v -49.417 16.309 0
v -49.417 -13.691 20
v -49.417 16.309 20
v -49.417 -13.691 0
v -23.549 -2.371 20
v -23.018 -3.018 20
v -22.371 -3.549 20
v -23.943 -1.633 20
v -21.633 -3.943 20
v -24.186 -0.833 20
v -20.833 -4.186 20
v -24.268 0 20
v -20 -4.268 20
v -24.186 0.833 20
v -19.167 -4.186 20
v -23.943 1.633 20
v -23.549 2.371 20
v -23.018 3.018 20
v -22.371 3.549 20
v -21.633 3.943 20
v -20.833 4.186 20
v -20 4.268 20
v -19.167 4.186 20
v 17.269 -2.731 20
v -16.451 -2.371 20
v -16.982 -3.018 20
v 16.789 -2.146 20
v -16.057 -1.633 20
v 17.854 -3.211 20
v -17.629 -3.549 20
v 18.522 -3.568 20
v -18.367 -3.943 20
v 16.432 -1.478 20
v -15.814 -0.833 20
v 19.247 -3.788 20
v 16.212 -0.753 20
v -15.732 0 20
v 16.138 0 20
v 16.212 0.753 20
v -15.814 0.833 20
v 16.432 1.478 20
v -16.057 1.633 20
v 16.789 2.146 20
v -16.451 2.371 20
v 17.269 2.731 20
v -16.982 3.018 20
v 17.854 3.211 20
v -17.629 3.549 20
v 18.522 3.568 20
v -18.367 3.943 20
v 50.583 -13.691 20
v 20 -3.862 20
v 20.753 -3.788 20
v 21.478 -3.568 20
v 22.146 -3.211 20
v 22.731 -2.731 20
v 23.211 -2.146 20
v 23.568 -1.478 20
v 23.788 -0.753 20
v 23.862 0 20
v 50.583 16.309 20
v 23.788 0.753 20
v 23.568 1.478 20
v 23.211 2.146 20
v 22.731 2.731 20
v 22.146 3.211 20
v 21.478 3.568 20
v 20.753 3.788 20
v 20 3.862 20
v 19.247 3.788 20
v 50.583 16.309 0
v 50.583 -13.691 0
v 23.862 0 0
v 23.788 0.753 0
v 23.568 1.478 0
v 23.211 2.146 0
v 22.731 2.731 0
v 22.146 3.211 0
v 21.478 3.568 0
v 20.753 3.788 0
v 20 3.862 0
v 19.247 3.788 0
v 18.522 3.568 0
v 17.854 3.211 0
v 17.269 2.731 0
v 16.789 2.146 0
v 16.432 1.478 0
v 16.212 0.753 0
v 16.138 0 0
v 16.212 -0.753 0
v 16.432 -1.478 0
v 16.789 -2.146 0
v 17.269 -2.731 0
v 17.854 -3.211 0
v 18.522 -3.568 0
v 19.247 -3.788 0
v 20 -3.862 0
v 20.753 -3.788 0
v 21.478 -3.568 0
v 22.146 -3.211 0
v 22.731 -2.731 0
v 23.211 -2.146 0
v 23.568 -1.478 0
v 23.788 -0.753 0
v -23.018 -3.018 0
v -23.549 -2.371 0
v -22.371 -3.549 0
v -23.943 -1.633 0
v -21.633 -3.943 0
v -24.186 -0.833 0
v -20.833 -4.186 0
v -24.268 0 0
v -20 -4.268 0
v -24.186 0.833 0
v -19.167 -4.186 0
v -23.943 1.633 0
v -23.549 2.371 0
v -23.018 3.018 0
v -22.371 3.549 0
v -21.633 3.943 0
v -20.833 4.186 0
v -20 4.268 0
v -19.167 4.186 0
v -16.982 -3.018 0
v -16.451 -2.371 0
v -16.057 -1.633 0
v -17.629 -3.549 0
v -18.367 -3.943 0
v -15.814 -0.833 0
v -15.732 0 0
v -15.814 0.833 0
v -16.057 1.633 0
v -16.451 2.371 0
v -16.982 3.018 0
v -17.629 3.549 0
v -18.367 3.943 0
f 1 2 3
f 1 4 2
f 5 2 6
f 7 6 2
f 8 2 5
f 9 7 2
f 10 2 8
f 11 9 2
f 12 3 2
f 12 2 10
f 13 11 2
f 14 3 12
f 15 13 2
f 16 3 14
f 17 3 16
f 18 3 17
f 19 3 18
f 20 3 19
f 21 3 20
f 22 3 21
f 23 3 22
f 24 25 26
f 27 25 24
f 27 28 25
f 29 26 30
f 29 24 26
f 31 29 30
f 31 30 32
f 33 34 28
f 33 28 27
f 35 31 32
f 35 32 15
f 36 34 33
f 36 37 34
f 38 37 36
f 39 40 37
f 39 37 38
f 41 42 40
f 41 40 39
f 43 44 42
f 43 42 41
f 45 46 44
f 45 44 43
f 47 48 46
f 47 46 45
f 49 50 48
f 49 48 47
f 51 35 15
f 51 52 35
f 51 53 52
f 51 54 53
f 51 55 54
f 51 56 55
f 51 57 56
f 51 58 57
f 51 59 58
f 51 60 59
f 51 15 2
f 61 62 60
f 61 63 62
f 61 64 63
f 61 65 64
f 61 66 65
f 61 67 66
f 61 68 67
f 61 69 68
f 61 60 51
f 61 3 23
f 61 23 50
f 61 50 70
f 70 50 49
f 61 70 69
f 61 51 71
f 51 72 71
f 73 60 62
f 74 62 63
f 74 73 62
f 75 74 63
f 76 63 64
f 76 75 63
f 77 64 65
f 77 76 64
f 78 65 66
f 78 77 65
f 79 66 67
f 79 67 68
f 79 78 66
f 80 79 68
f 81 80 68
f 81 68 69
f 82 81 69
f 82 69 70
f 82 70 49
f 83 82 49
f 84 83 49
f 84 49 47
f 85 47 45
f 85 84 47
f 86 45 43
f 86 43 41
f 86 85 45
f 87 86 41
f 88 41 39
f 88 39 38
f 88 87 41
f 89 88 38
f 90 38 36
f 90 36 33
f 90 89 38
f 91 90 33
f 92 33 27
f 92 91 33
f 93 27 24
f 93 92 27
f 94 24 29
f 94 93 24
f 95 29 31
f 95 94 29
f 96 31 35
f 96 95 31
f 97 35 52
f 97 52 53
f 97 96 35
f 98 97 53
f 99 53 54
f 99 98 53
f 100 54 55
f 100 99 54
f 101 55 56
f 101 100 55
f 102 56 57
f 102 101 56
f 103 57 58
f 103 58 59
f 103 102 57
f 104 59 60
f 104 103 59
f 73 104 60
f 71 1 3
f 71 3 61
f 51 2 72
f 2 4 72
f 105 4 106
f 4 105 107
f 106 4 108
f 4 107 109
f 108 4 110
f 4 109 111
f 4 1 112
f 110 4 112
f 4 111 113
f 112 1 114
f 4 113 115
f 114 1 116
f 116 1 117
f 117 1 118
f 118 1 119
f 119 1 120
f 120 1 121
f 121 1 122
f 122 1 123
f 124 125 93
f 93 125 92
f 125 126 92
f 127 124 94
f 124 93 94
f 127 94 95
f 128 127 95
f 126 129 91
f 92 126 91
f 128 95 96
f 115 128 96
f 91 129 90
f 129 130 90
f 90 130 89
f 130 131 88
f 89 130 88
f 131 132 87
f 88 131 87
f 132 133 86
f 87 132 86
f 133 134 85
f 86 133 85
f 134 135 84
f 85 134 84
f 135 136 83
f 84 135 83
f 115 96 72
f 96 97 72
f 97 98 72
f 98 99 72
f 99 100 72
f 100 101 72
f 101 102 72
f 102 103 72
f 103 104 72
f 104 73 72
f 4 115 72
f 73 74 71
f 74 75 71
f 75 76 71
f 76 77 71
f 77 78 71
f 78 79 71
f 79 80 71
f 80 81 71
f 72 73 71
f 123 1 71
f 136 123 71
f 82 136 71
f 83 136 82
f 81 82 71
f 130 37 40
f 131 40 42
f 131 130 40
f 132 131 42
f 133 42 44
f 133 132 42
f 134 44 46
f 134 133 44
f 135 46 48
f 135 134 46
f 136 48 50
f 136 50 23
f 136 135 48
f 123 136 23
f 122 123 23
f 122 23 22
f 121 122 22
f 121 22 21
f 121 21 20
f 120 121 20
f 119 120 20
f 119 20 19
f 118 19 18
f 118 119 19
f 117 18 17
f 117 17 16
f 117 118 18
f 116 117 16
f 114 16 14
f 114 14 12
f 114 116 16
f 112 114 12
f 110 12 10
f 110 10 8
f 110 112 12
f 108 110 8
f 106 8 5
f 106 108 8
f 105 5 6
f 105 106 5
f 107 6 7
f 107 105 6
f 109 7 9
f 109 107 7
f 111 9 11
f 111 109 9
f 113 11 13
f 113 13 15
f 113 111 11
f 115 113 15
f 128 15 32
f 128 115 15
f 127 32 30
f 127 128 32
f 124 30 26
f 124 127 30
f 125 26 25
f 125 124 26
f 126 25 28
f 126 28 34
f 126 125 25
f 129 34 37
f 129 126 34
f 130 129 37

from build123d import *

# Parameters (mm, degrees)
F0_W        = 100
F0_H        = 30
F0_R        = 4.26836
F0_R_2      = 3.862115
F1_DEPTH    = 19.6
F1_FACE_W   = 100
F1_FACE_H   = 30
F1_FACE_R   = 4.26836
F1_FACE_R_2 = 3.862115
F2_DEPTH    = 0.4


with BuildPart() as f1:
    # F0 (on Top) → F1 (new body)
    with BuildSketch(Plane.XY):
        with Locations((0.58333, 1.309117)):
            Rectangle(F0_W, F0_H)
        with Locations((-20, 0)):
            Circle(F0_R, mode=Mode.SUBTRACT)
        with Locations((20, 0)):
            Circle(F0_R_2, mode=Mode.SUBTRACT)
    extrude(amount=F1_DEPTH)

    # F1_face (on face) → F2 (join)
    with BuildSketch(Plane(origin=(0.675962, 1.356174, 19.6), x_dir=(1, 0, 0), z_dir=(0, 0, 1))):
        with Locations((-0.092632, -0.047057)):
            Rectangle(F1_FACE_W, F1_FACE_H)
        with Locations((-20.675962, -1.356174)):
            Circle(F1_FACE_R, mode=Mode.SUBTRACT)
        with Locations((19.324038, -1.356174)):
            Circle(F1_FACE_R_2, mode=Mode.SUBTRACT)
    extrude(amount=F2_DEPTH)


solid = f1.part
